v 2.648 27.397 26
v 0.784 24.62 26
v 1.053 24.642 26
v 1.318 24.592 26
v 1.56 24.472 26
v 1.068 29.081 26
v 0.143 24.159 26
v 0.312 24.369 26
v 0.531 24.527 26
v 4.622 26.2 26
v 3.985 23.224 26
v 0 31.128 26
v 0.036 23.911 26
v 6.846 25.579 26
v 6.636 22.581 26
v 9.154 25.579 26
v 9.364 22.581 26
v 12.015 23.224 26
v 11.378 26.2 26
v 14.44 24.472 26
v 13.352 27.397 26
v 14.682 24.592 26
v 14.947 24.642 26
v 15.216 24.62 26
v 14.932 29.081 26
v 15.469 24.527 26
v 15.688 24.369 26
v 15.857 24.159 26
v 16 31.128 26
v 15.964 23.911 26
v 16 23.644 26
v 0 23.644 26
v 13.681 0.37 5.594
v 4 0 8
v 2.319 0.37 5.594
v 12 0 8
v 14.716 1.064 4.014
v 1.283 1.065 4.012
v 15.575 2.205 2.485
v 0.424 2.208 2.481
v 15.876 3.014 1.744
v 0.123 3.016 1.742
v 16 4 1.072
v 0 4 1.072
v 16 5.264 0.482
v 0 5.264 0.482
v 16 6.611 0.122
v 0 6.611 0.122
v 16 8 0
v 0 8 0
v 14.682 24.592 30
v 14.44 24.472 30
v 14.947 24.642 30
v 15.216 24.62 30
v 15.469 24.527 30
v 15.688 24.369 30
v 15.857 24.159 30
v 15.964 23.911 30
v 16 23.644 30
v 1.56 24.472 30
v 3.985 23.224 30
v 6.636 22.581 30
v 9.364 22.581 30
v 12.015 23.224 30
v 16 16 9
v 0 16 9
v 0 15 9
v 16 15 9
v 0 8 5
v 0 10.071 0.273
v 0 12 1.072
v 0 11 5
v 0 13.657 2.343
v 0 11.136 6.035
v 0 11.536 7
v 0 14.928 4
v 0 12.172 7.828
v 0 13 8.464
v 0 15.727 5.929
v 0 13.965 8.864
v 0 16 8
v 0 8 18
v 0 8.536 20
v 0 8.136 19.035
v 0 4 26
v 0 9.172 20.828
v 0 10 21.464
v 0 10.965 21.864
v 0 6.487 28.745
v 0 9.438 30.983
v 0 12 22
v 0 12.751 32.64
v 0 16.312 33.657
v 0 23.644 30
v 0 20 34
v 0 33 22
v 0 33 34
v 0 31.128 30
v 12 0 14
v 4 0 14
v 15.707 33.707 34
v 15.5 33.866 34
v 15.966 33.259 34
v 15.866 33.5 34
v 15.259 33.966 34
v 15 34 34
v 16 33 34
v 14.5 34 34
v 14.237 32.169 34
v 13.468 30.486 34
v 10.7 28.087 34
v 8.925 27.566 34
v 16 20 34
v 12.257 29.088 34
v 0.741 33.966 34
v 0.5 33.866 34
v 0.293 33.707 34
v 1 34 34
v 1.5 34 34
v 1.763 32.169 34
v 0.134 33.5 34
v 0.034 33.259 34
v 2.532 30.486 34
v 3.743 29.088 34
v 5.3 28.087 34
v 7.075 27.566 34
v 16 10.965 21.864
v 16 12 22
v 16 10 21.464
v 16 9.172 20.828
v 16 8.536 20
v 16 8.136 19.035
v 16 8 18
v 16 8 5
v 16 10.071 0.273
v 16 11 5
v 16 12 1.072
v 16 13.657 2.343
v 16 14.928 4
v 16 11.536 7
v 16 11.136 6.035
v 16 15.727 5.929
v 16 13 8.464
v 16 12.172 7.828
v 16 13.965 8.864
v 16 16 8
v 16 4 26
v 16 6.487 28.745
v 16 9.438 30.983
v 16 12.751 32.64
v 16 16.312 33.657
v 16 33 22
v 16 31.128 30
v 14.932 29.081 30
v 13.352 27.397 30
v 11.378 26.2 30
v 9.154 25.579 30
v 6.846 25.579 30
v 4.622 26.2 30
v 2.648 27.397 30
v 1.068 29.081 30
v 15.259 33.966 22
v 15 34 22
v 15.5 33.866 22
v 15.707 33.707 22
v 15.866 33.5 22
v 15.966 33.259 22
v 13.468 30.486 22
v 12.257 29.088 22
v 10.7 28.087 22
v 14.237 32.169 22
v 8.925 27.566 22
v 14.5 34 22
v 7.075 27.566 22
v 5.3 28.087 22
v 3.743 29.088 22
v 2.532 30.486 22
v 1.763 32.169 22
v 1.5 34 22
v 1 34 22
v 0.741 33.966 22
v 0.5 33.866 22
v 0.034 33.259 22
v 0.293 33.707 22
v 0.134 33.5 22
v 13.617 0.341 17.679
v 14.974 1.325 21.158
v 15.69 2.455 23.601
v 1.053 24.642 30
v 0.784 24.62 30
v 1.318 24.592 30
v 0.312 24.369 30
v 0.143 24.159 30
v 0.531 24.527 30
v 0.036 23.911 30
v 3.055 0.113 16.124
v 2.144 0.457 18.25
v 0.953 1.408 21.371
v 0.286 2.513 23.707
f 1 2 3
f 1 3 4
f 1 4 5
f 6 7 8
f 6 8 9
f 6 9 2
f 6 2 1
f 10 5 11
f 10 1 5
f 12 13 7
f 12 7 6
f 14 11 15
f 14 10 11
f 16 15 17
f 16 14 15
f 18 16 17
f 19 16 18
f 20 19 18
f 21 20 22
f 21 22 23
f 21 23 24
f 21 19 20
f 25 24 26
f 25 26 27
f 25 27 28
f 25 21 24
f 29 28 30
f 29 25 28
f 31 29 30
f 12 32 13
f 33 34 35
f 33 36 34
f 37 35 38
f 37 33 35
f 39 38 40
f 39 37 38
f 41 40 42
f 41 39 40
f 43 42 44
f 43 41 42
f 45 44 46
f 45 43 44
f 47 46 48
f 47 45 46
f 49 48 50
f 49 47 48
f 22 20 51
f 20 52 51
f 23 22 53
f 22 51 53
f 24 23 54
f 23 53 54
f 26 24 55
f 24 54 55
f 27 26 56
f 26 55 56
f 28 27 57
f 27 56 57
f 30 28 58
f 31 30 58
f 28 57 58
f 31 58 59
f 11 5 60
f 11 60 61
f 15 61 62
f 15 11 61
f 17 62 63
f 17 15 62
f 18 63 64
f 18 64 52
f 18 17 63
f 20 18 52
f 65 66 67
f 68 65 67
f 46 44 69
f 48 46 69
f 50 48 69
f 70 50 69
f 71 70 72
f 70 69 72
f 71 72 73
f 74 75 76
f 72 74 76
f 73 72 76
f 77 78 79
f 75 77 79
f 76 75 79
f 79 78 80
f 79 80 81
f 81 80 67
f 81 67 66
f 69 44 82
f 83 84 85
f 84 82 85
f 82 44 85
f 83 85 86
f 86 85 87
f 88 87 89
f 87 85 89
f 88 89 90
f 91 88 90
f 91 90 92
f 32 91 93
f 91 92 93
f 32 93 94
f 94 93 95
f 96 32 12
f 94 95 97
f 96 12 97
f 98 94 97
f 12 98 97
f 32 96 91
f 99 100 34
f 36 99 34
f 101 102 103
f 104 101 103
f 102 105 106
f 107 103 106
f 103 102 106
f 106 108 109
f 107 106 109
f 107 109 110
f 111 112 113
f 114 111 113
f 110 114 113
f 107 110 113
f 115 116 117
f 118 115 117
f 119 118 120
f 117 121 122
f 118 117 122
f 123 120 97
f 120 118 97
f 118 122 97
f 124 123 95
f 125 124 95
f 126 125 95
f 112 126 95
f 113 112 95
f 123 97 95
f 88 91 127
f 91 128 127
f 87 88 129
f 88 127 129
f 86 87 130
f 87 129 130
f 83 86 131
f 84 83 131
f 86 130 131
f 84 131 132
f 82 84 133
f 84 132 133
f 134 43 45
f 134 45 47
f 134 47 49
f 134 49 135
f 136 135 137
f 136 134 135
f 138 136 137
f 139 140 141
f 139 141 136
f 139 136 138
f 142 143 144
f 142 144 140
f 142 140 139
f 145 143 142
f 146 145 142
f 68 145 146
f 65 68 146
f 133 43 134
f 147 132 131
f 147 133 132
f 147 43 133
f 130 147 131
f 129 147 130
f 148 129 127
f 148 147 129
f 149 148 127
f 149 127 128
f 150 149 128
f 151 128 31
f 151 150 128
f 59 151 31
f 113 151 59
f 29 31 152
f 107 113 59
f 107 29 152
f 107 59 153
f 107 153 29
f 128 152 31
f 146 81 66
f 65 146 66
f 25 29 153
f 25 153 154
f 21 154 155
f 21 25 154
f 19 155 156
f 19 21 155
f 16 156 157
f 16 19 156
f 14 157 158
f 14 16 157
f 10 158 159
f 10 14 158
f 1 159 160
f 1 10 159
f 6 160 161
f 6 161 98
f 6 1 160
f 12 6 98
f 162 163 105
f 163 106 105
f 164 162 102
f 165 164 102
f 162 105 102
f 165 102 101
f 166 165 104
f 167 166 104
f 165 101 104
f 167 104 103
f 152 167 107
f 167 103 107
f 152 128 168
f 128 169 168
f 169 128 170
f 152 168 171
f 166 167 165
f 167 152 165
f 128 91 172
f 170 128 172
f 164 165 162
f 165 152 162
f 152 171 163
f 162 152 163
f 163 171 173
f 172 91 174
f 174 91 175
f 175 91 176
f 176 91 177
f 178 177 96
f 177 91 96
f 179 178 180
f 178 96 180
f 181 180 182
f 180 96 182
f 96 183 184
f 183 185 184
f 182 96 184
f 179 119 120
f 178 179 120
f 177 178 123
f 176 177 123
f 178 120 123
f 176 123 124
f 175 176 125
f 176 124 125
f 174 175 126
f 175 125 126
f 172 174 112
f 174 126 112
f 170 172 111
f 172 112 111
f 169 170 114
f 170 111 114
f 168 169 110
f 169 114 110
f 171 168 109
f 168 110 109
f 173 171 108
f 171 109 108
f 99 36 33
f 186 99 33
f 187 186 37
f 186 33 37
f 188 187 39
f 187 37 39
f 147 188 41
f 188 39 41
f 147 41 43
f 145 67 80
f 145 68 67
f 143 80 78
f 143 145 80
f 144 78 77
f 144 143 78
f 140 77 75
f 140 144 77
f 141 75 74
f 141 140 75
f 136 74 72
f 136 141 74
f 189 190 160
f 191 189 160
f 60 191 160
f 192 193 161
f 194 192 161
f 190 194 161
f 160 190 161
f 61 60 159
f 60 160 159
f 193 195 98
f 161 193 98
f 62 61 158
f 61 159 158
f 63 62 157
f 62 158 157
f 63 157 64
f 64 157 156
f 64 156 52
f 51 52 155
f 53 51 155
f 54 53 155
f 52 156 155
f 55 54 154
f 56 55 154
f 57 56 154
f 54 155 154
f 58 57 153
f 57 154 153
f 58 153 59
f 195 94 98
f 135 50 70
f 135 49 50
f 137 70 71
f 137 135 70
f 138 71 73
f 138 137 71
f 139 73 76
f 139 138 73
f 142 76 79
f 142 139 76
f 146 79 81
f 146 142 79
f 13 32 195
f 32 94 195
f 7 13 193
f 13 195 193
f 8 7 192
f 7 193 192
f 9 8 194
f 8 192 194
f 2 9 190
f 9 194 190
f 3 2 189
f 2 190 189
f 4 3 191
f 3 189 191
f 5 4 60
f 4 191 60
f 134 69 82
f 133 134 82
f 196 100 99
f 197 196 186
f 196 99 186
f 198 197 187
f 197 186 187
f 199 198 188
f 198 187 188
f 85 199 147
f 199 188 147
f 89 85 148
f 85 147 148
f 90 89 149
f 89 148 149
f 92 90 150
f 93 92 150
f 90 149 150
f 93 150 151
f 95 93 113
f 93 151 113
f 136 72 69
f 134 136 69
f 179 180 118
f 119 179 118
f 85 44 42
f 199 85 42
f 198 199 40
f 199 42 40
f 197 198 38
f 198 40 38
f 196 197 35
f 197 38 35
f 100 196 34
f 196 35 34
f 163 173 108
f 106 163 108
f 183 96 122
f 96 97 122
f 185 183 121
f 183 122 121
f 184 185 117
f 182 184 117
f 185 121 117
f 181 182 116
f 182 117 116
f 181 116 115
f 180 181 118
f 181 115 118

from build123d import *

# Parameters (mm, degrees)
F1_DEPTH     = 16
F2_R         = 7.99999
F3_R         = 20
F4_R         = 3.99999
F6_DEPTH     = 34.001
F8_DEPTH     = 4
F11_R        = 1
F12_T1_DEPTH = 33.00001


# Not quite as in the source:
# - a fillet or chamfer that OpenCascade refuses, or shapes differently, is made with other operations: its cross-section is extruded or revolved along the edge and cut away or added
# - a fillet or chamfer is up to 0.001 mm smaller than in the source, because OpenCascade refuses the exact size


with BuildPart() as f1:
    # F0 (on Right) → F1 (new body)
    with BuildSketch(Plane.YZ):
        Polygon((34, 34), (0, 34), (0, 0), (16, 0), (16, 9), (11, 9), (11, 5), (8, 5), (8, 22), (34, 22), align=None)
    extrude(amount=F1_DEPTH)

    # F2 (radius 8 in the source; OpenCascade refuses exactly that, so slightly less here)
    f2_edges = [f1.edges().sort_by_distance(p)[0] for p in [
        (8, 16, 0),
        (8, 0, 0),
    ]]
    fillet(f2_edges, radius=F2_R)

    # F3
    f3_edges = [f1.edges().sort_by_distance(p)[0] for p in [
        (8, 0, 34),
    ]]
    fillet(f3_edges, radius=F3_R)

    # F4 (radius 4 in the source; OpenCascade refuses exactly that, so slightly less here)
    f4_edges = [f1.edges().sort_by_distance(p)[0] for p in [
        (8, 8, 22),
        (8, 11, 9),
    ]]
    fillet(f4_edges, radius=F4_R)

    # F5 (on face) → F6 (cut, through all)
    with BuildSketch(Plane.XY.offset(34)):
        with BuildLine():
            ThreePointArc((1.5, 34), (8, 27.5), (14.5, 34))
            Line((14.5, 34), (1.5, 34))
        make_face()
    extrude(amount=-F6_DEPTH, mode=Mode.SUBTRACT)


with BuildPart() as f8:
    # F7 (on face) → F8 (new body)
    with BuildSketch(Plane.XY.offset(34)):
        with BuildLine():
            ThreePointArc((16, 31.1277186767), (8, 25.5), (0, 31.1277186767))
            Line((0, 31.1277186767), (0, 25.7386441791))
            ThreePointArc((0, 25.7386441791), (8, 22.5), (16, 25.7386441791))
            Line((16, 25.7386441791), (16, 31.1277186767))
        make_face()
    extrude(amount=F8_DEPTH)


with BuildPart() as f8_1:
    # F9: moved
    add(f8.part.moved(Location((0, 0, -8))))


with BuildPart() as f1_1:
    add(f1.part)

    # F10: cut F8
    add(f8_1.part, mode=Mode.SUBTRACT)

    # F11
    f11_edges = [f1_1.edges().sort_by_distance(p)[0] for p in [
        (16, 34, 28),
        (16, 25.738644, 28),
        (0, 34, 28),
        (0, 25.738644, 28),
    ]]
    fillet(f11_edges, radius=F11_R)

    # F12: fillet of radius 4 on 2 edges, made by hand

    # F12_s2 → F12_t1 (cut)
    with BuildSketch(Plane.XY.offset(-2.00001)):
        with BuildLine():
            ThreePointArc((12, 0), (14.8284271247, 1.1715728753), (16, 4))
            Line((16, 4), (16, 0))
            Line((16, 0), (12, 0))
        make_face()
        with BuildLine():
            ThreePointArc((0, 4), (1.1715728753, 1.1715728753), (4, 0))
            Line((4, 0), (0, 0))
            Line((0, 0), (0, 4))
        make_face()
    extrude(amount=F12_T1_DEPTH, mode=Mode.SUBTRACT)


solid = f1_1.part
